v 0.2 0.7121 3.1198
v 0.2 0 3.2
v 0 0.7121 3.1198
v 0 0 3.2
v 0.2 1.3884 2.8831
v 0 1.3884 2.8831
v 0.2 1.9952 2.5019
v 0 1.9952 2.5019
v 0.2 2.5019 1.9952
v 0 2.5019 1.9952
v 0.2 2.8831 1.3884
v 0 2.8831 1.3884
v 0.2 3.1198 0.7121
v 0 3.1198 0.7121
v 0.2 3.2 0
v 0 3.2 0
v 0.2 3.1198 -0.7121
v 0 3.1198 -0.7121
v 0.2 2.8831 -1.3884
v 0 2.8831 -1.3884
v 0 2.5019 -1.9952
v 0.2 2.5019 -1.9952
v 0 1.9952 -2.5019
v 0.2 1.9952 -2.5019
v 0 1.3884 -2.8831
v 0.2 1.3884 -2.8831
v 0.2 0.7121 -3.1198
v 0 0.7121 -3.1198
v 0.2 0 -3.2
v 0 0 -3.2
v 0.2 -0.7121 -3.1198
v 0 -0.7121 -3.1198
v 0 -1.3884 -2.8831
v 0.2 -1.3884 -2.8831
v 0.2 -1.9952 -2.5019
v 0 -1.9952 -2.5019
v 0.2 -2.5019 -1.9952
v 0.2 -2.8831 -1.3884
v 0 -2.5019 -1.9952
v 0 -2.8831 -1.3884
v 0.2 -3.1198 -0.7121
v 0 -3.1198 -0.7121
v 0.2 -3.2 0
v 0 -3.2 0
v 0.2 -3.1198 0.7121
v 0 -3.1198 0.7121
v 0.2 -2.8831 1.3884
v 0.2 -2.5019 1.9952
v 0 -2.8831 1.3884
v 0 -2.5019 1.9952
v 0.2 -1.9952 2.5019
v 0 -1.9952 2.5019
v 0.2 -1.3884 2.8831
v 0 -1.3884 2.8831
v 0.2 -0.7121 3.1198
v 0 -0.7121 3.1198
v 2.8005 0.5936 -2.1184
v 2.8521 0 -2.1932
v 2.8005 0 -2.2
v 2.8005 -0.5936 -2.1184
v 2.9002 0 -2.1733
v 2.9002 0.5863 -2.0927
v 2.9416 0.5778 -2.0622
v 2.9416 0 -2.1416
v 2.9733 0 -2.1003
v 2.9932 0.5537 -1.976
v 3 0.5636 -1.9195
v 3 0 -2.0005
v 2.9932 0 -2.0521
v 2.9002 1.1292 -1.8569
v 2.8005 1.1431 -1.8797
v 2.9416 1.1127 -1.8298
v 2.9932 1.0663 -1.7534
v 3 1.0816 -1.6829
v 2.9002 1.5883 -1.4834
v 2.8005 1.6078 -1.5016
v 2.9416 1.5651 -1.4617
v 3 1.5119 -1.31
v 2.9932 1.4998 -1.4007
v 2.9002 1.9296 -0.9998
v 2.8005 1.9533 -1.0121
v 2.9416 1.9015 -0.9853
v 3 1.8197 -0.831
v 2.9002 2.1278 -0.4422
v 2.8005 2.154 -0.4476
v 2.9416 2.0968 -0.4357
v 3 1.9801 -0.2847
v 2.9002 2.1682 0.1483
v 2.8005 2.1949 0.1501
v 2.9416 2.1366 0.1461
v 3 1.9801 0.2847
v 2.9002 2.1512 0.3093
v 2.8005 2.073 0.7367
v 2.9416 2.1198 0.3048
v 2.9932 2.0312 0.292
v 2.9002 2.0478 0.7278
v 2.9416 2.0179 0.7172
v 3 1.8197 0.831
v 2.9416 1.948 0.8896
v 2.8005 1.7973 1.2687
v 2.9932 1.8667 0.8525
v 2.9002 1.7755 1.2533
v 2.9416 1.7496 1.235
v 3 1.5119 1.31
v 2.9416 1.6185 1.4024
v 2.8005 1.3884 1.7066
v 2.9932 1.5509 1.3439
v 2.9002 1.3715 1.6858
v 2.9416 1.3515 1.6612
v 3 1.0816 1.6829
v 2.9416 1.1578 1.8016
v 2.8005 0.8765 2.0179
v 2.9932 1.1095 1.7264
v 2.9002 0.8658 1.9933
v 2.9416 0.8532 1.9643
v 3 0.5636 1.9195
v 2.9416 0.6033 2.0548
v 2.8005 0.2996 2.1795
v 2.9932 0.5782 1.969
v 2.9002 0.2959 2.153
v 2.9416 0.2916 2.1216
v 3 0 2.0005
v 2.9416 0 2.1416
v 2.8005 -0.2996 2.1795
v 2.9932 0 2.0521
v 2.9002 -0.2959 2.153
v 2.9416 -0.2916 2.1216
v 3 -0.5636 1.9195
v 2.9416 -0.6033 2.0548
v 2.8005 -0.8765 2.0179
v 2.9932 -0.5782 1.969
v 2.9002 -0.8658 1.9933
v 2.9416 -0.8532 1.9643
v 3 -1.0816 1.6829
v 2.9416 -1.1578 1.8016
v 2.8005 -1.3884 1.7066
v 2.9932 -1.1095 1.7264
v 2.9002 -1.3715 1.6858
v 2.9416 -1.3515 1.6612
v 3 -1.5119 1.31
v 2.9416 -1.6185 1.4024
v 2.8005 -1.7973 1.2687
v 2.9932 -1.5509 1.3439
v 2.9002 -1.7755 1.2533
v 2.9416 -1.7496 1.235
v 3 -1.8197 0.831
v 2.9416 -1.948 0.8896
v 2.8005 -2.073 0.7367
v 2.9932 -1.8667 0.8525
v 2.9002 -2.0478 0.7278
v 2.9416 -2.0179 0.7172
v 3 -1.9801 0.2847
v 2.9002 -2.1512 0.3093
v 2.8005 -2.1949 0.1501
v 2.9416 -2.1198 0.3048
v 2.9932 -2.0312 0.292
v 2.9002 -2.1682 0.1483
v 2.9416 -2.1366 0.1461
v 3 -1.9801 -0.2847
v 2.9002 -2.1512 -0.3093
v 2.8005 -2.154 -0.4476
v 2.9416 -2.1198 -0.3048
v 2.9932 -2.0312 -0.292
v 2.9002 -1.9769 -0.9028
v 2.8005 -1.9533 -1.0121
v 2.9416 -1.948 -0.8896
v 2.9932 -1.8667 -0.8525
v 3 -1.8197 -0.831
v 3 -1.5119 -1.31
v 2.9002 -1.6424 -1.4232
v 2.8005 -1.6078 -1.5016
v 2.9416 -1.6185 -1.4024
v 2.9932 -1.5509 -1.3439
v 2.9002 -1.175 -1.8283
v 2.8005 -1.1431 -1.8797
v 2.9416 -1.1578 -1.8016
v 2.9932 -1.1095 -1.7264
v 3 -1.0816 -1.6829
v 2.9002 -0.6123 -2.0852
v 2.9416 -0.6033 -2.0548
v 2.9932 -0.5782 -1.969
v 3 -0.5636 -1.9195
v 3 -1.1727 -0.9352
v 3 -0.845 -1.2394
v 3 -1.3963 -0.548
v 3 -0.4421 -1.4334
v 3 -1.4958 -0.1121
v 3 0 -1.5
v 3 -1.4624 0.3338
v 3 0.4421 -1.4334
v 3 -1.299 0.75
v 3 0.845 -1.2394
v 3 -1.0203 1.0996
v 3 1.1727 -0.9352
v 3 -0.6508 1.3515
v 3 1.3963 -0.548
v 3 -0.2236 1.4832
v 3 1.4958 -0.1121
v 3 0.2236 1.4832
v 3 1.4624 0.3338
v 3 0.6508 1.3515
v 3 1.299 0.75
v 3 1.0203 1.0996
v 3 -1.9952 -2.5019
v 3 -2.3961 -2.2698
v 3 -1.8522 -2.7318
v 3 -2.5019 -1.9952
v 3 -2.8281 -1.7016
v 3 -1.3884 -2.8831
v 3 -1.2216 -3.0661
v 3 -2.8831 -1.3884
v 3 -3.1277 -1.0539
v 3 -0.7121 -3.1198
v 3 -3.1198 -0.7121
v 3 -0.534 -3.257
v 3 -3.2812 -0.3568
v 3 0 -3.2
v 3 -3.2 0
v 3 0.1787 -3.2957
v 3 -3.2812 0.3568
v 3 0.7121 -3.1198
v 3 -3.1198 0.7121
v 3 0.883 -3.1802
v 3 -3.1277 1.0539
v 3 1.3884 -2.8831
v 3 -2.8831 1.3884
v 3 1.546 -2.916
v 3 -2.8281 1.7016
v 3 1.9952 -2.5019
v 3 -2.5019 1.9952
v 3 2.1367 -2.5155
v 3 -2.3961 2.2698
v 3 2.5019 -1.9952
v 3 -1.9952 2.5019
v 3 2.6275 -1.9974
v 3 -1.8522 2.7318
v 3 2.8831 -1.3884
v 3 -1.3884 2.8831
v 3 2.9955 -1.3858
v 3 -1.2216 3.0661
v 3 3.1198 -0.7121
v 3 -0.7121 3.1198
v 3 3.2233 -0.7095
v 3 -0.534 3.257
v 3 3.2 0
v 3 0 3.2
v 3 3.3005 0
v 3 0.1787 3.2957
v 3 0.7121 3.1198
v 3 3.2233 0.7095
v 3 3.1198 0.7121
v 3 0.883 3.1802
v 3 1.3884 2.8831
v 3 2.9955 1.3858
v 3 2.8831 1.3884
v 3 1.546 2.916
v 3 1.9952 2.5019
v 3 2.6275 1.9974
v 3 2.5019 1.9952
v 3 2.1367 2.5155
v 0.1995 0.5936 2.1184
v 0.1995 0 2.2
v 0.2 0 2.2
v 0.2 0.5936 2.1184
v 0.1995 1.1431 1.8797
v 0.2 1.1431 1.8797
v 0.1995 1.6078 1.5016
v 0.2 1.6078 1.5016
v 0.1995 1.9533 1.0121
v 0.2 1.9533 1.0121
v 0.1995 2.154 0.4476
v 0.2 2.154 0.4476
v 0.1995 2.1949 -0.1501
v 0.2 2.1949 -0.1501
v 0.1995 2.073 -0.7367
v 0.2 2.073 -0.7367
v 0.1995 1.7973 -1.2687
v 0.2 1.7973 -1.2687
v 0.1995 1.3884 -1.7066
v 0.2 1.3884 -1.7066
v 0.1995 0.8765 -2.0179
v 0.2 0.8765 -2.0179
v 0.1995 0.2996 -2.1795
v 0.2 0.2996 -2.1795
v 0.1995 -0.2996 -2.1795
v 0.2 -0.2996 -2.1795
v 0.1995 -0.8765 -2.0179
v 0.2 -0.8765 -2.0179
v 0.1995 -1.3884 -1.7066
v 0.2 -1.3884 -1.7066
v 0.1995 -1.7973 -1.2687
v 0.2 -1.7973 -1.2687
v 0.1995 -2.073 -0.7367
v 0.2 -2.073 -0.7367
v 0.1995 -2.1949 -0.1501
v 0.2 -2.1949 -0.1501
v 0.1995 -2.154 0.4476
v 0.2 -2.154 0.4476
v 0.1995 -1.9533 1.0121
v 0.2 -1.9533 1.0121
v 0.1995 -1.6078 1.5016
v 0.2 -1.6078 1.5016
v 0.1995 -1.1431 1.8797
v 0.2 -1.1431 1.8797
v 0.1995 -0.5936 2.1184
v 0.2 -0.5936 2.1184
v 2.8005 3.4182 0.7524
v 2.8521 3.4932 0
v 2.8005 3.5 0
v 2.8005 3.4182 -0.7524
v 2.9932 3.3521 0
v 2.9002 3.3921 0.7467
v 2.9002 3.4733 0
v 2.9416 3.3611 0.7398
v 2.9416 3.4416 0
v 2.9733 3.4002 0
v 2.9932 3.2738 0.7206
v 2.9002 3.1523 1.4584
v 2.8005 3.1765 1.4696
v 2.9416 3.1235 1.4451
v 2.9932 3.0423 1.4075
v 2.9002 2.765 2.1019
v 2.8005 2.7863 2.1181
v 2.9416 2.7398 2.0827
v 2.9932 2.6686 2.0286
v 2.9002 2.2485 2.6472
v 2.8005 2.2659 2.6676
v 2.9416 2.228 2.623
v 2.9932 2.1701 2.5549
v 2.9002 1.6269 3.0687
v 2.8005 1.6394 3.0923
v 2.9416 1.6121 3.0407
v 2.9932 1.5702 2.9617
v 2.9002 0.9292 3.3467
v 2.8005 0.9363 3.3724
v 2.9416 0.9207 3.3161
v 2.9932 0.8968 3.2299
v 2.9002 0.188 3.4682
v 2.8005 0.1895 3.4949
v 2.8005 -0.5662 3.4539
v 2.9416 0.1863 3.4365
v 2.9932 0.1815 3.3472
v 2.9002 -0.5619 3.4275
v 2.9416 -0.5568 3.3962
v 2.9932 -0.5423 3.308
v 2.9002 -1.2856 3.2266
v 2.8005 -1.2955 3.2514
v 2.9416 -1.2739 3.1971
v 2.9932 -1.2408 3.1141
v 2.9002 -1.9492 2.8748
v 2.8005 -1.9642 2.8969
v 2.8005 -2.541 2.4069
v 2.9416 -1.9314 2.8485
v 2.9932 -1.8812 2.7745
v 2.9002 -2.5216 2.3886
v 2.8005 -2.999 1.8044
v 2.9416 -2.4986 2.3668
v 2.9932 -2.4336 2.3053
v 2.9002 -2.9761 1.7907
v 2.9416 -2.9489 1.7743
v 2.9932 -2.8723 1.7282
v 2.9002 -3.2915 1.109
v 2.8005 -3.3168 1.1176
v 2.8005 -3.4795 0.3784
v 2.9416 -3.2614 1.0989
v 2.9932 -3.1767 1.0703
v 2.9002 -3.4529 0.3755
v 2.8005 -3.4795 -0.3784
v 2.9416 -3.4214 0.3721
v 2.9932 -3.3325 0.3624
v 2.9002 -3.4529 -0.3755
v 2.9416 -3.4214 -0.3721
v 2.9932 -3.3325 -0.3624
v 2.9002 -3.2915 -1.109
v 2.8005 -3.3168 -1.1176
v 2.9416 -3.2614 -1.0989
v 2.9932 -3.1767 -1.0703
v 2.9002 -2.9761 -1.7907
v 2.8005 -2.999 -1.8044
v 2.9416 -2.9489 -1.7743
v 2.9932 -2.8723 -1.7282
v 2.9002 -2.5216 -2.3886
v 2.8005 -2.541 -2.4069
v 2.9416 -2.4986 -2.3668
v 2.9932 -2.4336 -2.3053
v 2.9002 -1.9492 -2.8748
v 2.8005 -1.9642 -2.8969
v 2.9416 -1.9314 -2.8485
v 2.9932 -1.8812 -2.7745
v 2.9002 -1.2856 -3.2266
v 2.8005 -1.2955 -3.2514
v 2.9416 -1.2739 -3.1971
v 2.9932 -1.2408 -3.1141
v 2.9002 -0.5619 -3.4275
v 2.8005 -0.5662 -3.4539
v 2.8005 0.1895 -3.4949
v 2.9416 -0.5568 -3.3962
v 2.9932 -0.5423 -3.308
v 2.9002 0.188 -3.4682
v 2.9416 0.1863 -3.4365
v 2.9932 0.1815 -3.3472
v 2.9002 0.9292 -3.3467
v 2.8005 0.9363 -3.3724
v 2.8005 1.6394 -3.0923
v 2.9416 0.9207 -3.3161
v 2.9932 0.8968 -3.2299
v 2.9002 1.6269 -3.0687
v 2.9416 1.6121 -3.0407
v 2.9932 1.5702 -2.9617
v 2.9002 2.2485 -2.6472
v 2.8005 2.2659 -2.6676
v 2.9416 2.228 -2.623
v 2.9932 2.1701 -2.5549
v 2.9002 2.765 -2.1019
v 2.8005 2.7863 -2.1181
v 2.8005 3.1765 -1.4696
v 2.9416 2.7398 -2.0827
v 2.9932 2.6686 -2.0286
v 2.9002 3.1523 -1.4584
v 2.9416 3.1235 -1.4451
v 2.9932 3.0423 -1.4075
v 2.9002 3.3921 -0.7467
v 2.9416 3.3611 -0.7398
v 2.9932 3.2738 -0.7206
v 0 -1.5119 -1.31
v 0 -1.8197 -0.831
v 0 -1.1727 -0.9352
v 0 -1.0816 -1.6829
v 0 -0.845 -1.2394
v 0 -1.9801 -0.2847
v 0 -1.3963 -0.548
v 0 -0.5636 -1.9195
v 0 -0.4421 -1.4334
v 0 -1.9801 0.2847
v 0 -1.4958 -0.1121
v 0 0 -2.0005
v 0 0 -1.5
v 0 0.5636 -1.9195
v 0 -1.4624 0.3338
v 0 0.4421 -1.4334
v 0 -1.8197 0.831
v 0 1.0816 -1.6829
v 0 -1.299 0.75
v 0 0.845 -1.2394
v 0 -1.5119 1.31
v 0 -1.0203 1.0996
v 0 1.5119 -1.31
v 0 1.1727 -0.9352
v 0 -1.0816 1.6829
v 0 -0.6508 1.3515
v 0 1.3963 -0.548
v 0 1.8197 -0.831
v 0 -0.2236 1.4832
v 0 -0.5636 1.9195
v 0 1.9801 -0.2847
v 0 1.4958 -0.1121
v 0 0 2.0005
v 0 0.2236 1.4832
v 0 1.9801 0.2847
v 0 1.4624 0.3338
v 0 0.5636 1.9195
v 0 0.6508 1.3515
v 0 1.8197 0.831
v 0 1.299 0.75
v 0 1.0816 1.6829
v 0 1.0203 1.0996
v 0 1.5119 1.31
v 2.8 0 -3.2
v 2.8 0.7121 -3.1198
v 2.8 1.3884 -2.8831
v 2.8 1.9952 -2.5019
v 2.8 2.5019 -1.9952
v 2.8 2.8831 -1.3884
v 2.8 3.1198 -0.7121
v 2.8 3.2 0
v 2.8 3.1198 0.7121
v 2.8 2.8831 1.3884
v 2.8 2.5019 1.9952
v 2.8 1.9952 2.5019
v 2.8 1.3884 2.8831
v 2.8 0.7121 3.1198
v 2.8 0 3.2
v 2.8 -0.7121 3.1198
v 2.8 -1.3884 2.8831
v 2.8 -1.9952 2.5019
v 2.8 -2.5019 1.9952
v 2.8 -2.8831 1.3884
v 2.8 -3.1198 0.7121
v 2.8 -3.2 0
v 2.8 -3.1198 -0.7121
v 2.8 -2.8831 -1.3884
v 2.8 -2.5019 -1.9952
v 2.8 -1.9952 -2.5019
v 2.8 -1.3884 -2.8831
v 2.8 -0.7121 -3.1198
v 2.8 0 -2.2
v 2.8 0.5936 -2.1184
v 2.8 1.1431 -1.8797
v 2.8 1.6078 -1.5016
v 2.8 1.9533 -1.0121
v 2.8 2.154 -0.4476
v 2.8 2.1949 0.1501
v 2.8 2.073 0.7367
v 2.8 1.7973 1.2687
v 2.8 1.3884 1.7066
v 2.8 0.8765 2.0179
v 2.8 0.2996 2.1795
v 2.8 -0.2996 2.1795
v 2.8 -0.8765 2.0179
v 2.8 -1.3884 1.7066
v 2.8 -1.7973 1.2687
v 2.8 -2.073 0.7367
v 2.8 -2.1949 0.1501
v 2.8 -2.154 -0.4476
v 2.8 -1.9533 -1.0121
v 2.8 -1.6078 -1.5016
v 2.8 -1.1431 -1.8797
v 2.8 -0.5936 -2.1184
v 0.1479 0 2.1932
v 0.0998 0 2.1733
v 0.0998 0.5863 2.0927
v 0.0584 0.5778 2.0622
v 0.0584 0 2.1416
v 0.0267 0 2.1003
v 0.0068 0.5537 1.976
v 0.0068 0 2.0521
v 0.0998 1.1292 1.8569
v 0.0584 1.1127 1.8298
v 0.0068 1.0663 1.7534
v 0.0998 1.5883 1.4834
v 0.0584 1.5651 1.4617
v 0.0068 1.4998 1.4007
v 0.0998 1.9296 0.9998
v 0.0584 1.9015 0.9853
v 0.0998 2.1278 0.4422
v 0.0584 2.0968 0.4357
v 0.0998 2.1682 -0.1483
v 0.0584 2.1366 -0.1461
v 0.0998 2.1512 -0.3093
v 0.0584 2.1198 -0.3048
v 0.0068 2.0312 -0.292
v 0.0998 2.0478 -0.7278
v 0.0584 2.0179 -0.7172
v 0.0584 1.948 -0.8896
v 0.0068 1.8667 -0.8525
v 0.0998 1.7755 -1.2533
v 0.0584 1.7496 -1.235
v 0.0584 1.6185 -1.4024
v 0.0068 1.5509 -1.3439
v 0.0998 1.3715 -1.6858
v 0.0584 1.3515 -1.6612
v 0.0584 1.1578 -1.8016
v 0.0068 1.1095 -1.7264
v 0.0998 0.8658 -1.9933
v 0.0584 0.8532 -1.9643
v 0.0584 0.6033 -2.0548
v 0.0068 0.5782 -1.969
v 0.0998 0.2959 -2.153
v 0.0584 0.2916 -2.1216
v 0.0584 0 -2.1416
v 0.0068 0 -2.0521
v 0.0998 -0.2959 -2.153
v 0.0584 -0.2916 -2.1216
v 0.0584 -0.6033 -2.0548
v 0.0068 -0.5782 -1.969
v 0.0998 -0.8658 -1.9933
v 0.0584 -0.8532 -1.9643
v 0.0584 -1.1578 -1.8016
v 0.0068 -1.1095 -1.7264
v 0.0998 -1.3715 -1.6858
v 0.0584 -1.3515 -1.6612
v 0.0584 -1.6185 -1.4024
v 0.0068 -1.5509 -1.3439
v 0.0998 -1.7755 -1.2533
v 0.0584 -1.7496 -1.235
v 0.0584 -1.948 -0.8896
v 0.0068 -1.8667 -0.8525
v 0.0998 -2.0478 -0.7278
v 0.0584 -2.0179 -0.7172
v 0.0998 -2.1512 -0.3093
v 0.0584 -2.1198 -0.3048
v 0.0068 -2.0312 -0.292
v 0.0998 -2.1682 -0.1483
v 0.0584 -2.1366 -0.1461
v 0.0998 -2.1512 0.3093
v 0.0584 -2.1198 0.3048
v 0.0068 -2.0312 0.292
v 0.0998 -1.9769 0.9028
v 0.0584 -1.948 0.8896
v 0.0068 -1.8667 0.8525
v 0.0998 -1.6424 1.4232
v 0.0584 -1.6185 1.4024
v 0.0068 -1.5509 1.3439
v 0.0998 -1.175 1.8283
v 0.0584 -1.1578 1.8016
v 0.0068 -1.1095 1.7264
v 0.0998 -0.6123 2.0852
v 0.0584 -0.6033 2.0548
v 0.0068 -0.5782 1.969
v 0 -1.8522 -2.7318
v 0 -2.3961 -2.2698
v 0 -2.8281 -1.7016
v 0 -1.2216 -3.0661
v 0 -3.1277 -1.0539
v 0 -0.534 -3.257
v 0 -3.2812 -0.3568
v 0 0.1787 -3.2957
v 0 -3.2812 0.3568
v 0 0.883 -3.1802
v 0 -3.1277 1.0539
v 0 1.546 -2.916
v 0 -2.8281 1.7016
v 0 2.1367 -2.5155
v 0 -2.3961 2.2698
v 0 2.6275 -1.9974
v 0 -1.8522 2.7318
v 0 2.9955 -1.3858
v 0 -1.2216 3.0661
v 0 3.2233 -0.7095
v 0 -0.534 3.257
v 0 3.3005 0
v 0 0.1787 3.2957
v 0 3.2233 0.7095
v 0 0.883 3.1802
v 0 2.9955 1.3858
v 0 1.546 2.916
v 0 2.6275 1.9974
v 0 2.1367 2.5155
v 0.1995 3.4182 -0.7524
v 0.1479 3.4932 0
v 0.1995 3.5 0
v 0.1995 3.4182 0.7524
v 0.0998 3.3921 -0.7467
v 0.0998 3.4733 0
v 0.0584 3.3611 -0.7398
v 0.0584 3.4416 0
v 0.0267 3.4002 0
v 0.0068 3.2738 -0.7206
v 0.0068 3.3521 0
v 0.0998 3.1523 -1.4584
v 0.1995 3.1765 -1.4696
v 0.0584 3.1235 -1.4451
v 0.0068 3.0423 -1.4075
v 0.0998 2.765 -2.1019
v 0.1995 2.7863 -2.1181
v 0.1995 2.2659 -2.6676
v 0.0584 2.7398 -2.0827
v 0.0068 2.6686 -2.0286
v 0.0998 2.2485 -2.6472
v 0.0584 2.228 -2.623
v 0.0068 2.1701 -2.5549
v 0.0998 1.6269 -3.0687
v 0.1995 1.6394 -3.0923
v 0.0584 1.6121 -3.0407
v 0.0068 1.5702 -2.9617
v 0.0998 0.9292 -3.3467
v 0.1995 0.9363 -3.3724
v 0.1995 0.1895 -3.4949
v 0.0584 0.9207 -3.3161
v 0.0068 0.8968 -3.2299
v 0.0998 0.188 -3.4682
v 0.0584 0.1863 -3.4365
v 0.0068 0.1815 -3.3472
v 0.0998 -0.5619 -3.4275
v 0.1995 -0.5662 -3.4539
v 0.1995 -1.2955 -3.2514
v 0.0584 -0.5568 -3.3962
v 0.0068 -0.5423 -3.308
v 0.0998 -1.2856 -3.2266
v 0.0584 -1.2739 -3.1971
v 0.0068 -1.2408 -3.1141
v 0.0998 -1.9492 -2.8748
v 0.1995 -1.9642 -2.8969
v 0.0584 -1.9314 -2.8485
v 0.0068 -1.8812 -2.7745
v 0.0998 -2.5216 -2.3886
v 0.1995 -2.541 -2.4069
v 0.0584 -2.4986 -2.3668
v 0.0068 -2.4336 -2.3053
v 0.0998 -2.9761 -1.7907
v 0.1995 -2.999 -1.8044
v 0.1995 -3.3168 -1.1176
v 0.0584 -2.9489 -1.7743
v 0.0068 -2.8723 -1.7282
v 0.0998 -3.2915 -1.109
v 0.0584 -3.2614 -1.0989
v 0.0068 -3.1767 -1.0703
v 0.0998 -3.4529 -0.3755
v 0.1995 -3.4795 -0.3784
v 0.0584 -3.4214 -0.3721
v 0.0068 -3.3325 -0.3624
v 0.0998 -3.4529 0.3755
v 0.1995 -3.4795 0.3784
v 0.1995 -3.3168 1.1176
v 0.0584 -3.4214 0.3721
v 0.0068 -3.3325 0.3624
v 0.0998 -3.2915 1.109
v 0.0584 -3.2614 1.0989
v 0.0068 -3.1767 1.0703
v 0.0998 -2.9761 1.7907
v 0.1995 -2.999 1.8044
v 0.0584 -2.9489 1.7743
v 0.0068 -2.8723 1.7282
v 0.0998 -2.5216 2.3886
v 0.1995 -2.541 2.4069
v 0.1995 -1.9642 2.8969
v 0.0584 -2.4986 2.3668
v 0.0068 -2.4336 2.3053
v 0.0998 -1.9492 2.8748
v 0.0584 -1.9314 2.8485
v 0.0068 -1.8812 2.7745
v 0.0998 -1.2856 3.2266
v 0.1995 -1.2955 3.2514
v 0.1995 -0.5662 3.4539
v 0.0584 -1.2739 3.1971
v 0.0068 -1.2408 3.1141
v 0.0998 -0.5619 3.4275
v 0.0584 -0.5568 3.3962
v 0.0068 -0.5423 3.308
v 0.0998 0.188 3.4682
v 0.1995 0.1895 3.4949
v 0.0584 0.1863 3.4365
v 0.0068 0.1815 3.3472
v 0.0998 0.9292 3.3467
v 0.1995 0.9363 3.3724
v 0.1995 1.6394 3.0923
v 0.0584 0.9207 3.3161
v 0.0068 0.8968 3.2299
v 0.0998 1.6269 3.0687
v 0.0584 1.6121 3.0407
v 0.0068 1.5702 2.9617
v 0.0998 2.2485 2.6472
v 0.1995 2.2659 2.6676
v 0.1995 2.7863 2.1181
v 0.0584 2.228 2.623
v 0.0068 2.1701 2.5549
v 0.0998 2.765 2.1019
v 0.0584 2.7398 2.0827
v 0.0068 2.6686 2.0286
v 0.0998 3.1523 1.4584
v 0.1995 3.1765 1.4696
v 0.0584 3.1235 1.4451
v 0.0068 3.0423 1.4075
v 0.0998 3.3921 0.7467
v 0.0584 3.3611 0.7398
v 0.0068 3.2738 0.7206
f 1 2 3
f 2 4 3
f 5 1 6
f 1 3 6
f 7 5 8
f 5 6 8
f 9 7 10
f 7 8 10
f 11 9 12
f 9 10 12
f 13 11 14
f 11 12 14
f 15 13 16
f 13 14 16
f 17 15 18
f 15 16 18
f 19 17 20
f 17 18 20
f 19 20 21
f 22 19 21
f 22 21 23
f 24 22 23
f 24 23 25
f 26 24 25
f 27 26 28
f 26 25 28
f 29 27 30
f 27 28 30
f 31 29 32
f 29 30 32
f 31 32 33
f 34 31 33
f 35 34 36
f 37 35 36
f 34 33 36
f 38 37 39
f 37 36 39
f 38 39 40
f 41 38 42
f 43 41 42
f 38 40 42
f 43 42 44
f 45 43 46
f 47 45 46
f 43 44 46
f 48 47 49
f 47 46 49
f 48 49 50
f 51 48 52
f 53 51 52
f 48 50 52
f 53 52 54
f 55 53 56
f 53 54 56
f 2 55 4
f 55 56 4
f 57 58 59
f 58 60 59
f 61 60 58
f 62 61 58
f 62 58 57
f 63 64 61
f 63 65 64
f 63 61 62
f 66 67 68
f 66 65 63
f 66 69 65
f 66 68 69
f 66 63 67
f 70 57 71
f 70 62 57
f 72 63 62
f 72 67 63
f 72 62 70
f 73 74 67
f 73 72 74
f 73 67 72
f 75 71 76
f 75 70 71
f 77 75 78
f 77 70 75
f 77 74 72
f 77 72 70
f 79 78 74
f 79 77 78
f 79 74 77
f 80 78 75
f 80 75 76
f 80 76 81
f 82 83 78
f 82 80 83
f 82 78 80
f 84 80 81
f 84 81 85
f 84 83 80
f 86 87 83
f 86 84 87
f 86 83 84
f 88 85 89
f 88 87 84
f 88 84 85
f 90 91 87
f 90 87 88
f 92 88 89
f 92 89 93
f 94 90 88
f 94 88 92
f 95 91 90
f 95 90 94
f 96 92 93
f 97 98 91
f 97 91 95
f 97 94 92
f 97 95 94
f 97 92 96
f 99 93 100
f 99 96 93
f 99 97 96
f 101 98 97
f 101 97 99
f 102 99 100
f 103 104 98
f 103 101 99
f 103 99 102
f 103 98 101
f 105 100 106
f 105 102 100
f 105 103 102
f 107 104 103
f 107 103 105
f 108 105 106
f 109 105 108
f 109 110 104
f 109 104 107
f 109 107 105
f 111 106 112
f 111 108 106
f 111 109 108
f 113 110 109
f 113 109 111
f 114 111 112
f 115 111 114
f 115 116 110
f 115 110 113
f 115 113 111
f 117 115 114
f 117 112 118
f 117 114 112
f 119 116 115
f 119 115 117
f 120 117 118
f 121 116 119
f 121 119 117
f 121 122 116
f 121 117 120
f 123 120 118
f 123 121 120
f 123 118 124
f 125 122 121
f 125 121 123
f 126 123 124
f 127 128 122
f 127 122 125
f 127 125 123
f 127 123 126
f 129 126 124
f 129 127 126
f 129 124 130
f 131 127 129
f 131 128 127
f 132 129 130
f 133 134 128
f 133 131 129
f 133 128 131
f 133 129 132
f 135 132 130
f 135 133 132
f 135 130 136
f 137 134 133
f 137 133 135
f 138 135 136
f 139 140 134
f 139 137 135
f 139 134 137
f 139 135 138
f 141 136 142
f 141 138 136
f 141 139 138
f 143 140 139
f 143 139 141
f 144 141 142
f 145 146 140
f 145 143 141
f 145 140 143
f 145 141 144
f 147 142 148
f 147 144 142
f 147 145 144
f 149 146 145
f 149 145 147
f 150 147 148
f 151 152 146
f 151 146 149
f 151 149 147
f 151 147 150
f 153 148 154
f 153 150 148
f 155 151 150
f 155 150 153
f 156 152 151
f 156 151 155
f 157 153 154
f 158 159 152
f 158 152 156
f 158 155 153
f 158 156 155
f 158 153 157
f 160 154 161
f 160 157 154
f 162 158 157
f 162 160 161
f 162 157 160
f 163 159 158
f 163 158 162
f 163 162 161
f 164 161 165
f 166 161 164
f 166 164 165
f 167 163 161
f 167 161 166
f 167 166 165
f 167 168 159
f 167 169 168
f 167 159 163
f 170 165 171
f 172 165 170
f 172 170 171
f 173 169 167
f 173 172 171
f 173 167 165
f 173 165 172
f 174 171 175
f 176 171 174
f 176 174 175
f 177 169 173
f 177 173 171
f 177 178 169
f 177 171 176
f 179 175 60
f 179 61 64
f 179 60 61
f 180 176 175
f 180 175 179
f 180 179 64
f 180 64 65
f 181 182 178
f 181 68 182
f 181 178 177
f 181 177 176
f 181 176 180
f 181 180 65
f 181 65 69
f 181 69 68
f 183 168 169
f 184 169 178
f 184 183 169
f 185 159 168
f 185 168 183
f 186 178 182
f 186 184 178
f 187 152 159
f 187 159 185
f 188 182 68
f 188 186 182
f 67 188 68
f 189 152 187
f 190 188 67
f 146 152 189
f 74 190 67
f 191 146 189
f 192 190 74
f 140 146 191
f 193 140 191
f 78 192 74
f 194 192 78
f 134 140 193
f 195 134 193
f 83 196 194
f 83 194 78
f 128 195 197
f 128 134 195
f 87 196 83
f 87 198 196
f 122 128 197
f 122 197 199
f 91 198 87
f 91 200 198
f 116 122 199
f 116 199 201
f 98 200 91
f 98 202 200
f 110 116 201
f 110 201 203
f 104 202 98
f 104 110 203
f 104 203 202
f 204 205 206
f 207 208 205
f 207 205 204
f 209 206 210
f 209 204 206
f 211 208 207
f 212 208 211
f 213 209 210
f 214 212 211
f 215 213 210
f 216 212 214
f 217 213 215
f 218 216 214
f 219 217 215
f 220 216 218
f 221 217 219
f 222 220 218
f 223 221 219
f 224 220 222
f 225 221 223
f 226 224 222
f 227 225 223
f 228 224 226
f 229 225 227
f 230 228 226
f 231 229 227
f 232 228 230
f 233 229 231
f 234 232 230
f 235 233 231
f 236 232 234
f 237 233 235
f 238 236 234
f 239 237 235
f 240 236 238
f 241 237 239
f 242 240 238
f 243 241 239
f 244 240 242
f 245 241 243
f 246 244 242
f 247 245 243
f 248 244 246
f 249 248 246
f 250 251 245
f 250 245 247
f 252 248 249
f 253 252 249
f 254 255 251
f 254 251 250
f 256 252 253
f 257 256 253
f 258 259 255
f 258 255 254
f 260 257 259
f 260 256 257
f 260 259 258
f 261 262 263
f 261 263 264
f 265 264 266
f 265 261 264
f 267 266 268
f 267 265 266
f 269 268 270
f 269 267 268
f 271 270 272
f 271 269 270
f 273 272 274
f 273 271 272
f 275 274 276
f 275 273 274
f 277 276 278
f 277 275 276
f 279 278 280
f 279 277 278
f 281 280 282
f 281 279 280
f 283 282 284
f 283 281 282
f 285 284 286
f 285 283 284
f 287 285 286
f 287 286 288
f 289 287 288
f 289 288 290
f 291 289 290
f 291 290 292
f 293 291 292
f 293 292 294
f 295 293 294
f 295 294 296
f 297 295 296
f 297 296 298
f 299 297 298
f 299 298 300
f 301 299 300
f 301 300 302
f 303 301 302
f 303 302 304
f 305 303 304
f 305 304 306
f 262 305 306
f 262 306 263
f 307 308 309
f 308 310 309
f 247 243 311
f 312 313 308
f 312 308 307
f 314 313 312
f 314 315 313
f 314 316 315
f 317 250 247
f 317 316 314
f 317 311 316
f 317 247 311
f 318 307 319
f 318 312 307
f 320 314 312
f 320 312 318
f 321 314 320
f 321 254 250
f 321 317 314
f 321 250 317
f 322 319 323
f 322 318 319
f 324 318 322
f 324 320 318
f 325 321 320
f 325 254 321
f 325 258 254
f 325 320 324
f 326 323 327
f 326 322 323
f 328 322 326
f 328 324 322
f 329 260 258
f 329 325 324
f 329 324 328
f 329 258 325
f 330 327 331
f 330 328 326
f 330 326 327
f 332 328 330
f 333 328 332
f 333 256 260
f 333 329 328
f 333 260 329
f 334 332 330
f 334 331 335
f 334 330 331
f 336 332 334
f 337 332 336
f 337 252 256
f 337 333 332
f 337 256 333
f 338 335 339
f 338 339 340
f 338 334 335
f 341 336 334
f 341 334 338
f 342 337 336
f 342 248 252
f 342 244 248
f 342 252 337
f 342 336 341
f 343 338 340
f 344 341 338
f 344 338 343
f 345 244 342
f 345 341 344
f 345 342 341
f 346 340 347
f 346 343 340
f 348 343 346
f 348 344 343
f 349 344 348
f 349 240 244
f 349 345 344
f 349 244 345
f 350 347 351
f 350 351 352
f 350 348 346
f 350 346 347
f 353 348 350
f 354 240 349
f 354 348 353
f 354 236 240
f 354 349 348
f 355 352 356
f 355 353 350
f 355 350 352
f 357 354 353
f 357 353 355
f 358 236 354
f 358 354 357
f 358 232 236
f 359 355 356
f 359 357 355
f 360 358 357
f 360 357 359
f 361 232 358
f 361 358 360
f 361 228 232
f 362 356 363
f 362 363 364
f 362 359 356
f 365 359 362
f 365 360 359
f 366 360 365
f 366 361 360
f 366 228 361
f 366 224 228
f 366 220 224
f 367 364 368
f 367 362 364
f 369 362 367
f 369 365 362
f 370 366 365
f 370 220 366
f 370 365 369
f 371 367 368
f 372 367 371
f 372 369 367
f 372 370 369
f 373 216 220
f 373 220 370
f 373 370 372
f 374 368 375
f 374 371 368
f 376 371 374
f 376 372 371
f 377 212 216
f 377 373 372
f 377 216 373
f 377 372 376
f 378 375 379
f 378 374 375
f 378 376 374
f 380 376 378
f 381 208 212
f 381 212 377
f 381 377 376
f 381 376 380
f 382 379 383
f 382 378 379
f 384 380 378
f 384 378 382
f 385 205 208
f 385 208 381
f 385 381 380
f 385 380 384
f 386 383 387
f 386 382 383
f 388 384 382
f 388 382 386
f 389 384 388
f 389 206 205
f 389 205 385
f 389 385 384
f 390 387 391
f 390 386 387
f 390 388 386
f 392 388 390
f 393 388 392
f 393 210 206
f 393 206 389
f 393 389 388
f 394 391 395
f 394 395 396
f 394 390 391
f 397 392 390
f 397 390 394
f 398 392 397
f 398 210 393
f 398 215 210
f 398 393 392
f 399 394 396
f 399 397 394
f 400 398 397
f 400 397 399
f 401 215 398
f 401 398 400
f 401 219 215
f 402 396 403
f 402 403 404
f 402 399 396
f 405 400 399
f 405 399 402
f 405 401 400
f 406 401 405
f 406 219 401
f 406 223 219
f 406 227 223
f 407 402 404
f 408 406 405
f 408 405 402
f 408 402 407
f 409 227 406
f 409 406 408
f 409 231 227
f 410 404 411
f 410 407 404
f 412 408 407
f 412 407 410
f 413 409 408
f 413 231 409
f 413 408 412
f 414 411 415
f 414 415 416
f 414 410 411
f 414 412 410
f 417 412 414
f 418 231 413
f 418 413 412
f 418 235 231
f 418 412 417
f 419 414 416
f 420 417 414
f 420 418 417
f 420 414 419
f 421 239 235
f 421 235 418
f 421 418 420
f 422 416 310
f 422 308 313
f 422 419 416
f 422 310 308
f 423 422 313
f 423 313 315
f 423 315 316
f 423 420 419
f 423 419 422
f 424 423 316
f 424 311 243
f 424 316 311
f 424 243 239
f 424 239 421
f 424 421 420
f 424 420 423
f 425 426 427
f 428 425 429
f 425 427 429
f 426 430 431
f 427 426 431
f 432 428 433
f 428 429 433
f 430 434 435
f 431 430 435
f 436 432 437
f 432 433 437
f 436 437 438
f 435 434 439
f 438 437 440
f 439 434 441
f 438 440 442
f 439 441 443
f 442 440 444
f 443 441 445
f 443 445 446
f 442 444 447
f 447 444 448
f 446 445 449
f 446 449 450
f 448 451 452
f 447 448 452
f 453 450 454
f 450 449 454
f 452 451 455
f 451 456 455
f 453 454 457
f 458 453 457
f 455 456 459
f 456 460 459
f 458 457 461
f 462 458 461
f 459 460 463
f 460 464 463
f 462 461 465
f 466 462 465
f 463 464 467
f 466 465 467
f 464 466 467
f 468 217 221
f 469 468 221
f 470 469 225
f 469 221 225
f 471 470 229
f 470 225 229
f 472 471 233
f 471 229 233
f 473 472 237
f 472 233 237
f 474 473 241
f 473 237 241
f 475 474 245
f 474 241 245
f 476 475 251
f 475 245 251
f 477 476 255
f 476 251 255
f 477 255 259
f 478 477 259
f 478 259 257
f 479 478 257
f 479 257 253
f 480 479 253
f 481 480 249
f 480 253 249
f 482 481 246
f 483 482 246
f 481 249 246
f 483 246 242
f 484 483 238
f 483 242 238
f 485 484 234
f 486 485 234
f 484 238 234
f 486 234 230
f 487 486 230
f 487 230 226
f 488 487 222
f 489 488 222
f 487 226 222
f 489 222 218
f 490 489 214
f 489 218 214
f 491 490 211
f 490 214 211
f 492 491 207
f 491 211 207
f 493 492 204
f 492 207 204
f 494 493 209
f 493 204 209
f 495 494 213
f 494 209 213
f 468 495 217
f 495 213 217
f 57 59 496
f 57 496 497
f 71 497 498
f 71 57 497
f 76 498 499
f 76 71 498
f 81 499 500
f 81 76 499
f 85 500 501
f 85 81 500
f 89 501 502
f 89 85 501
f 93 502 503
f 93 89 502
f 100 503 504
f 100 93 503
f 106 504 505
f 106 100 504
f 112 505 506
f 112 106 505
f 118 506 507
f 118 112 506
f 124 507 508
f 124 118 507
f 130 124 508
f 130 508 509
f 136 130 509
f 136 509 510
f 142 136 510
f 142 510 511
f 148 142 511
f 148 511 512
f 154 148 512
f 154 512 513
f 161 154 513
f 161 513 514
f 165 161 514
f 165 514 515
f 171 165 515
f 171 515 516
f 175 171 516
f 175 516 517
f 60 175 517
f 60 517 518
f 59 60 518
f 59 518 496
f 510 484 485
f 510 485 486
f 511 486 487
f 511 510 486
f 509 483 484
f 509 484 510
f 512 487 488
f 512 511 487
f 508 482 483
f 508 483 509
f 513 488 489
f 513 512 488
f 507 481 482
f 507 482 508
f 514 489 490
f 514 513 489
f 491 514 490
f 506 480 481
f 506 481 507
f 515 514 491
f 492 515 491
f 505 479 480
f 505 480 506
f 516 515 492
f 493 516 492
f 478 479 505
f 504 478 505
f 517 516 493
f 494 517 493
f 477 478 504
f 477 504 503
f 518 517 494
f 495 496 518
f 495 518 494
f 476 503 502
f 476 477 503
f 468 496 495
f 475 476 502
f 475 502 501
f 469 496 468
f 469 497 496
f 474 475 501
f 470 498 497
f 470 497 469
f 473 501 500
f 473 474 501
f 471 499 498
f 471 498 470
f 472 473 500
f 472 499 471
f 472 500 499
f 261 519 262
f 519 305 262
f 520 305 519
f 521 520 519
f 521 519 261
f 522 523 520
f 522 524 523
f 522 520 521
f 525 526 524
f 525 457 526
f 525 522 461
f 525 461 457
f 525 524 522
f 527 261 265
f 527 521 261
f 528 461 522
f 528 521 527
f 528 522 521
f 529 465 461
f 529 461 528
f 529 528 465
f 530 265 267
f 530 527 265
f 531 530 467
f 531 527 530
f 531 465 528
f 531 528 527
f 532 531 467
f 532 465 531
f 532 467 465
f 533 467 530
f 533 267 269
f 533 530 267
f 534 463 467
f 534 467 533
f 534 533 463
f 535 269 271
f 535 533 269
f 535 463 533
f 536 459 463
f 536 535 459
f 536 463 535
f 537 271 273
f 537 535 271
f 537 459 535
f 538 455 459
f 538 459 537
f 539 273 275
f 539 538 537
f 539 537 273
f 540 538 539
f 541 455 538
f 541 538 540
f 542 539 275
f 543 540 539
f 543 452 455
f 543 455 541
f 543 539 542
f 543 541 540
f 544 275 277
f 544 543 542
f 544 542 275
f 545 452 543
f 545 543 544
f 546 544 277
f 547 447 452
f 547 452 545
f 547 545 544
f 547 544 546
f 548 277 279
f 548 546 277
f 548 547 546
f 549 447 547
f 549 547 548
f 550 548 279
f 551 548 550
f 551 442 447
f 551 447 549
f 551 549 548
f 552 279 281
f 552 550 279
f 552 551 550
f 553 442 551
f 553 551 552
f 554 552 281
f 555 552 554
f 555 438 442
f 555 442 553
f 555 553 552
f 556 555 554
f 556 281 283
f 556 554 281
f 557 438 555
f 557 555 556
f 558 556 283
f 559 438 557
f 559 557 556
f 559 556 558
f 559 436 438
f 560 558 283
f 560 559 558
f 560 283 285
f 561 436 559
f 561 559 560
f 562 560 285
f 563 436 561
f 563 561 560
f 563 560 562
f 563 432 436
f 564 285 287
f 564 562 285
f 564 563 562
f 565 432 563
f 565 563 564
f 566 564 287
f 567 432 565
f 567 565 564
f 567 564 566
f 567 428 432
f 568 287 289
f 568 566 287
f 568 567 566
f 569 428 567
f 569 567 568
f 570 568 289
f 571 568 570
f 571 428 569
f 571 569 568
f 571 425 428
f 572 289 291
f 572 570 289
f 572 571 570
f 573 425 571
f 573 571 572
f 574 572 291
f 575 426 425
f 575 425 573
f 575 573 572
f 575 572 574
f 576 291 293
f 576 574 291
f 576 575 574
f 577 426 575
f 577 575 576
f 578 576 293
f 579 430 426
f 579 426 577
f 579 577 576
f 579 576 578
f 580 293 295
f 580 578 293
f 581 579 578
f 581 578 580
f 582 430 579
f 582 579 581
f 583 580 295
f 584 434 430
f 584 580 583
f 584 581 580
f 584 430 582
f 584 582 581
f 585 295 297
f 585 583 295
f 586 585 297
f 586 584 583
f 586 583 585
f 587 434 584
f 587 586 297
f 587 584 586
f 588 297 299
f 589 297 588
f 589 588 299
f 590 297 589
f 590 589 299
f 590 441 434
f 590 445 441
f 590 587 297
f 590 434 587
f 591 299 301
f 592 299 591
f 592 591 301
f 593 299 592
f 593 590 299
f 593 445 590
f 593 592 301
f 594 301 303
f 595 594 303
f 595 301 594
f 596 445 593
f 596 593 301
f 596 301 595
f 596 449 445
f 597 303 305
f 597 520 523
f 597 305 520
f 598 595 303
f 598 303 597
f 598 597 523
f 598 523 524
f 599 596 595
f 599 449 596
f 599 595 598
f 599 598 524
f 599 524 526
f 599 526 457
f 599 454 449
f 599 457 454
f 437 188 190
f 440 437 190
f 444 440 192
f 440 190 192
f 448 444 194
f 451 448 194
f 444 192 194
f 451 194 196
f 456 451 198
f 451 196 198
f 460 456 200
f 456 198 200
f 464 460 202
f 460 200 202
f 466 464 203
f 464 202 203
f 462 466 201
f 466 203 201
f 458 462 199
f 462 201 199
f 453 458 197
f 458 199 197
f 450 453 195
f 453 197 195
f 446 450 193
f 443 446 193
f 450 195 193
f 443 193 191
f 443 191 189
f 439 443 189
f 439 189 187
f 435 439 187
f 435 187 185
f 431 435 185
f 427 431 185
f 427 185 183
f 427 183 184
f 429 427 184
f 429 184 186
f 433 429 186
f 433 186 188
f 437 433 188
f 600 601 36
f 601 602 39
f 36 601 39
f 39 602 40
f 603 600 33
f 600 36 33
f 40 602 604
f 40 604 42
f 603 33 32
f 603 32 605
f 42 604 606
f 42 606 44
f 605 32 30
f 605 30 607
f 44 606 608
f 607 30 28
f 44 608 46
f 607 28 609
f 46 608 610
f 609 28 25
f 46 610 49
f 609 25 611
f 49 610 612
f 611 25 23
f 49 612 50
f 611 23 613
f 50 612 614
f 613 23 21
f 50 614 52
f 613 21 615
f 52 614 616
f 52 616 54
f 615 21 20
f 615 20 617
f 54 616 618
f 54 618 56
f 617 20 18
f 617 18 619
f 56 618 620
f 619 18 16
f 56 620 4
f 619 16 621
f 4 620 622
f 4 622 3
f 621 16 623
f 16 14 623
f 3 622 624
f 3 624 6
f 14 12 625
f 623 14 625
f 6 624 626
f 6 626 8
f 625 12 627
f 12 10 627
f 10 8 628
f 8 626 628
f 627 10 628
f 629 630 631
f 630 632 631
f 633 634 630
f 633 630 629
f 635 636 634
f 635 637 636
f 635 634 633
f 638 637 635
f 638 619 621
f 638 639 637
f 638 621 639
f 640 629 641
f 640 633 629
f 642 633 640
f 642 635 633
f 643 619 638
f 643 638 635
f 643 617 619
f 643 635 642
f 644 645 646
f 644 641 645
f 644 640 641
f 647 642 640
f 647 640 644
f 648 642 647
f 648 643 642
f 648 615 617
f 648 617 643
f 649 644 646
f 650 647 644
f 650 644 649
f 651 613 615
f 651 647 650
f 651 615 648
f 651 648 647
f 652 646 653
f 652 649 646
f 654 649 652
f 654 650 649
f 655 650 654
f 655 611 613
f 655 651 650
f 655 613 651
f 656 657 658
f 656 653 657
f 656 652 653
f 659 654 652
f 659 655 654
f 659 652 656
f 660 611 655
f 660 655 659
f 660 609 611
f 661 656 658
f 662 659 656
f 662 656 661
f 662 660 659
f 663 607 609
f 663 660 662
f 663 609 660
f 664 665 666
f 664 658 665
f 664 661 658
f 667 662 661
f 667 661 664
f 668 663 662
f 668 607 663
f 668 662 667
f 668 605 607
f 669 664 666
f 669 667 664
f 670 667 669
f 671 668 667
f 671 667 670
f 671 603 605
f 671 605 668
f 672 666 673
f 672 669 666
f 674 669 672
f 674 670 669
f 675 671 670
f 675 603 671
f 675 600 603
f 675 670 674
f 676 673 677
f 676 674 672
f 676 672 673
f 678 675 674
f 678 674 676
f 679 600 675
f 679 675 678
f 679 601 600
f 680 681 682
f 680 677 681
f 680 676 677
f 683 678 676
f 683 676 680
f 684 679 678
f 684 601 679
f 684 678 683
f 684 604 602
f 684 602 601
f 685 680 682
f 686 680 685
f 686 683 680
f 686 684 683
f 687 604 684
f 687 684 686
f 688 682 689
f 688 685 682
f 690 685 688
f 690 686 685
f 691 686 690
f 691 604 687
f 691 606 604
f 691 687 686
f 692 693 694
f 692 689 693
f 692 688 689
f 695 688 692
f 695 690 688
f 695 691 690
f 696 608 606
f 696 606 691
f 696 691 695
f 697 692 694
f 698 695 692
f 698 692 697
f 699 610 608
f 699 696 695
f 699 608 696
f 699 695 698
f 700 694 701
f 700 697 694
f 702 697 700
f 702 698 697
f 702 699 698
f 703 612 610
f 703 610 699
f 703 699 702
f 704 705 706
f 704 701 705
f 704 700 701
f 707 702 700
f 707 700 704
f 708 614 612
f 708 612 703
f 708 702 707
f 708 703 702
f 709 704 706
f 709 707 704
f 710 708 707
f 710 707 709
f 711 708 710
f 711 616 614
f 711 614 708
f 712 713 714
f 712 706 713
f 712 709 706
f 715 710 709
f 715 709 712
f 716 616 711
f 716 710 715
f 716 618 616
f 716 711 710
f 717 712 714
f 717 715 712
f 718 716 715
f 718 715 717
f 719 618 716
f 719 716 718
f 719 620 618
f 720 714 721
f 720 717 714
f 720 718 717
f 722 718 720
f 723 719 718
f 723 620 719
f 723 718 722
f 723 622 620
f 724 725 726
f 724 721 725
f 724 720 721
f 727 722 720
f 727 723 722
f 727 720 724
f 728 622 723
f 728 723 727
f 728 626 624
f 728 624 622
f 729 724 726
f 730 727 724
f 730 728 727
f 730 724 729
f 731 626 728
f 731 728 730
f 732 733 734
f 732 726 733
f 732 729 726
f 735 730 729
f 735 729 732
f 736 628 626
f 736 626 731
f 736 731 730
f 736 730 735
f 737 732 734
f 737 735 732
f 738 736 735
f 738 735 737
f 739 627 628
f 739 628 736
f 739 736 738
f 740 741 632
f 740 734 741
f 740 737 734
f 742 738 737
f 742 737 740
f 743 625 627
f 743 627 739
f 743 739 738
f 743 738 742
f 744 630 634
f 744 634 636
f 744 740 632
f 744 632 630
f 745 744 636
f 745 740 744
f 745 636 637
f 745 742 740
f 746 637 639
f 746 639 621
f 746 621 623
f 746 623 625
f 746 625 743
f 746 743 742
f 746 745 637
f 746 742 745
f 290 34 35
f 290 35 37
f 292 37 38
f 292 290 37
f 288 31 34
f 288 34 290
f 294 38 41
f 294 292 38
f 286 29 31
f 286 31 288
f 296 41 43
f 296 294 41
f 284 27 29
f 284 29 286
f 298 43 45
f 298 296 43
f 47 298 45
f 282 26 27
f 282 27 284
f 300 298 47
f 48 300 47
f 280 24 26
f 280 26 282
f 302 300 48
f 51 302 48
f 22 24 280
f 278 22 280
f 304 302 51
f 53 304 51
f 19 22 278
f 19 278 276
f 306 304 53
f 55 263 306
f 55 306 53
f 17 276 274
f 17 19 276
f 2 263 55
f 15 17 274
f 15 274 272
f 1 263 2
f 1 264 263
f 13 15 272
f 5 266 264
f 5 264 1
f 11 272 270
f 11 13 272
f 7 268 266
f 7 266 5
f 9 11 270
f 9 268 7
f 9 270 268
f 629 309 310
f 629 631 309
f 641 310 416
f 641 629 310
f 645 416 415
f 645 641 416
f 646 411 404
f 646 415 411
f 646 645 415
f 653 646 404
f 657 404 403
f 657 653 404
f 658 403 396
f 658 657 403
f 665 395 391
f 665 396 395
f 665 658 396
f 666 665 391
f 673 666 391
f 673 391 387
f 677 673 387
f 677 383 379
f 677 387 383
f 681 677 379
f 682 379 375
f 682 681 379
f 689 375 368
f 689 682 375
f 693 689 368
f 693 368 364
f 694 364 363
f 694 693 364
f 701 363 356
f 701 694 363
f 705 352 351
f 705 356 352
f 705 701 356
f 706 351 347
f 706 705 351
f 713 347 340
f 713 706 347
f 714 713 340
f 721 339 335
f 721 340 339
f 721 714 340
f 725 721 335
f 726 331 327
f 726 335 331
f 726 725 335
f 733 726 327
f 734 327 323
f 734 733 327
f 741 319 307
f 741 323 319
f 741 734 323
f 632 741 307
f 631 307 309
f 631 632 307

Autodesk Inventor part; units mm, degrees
ref_plane "YZ Plane" through (0, 0, 0) normal (1, 0, 0) x (0, 1, 0)
ref_plane "XZ Plane" through (0, 0, 0) normal (0, 1, 0) x (-1, 0, 0)
ref_plane "XY Plane" through (0, 0, 0) normal (0, 0, 1) x (1, 0, 0)
sketch "スケッチ1" plane through (0, 0, 0) normal (1, 0, 0) x (0, 1, 0)
  circle A0 centre (0, 0) radius 3.5
  dimension "d0" = 7
extrude "押し出し1" add sketch "スケッチ1" along normal blind 3
sketch "スケッチ2" plane through (3, 0, 0) normal (1, 0, 0) x (0, 0, -1)
  circle A0 centre (0, 0) radius 1.5
  dimension "d3" = 3
extrude "押し出し2" cut sketch "スケッチ2" against normal blind 3
sketch "スケッチ3" plane through (3, 0, 0) normal (1, 0, 0) x (0, 0, -1)
  circle A0 centre (0, 0) radius 3.2
  circle A1 centre (0, 0) radius 2.2
  circle A2 centre (0, 0) radius 3.5 projected
  dimension "d6" = 0.3
  dimension "d7" = 1
extrude "押し出し3" cut sketch "スケッチ3" against normal blind 0.2 contours A0
sketch "スケッチ4" plane through (0, 0, 0) normal (-1, 0, 0) x (0, 0, 1)
  circle A0 centre (0, 0) radius 3.2 projected
  circle A1 centre (0, 0) radius 2.2 projected
extrude "押し出し4" cut sketch "スケッチ4" against normal blind 0.2
fillet "フィレット1" radius 0.2 4 edges at (0, -3.5, 0) (0, 0, -2.2) (3, -3.5, 0) (3, 0, 2.2)
properties part number "bearing" material "鋼、合金"
